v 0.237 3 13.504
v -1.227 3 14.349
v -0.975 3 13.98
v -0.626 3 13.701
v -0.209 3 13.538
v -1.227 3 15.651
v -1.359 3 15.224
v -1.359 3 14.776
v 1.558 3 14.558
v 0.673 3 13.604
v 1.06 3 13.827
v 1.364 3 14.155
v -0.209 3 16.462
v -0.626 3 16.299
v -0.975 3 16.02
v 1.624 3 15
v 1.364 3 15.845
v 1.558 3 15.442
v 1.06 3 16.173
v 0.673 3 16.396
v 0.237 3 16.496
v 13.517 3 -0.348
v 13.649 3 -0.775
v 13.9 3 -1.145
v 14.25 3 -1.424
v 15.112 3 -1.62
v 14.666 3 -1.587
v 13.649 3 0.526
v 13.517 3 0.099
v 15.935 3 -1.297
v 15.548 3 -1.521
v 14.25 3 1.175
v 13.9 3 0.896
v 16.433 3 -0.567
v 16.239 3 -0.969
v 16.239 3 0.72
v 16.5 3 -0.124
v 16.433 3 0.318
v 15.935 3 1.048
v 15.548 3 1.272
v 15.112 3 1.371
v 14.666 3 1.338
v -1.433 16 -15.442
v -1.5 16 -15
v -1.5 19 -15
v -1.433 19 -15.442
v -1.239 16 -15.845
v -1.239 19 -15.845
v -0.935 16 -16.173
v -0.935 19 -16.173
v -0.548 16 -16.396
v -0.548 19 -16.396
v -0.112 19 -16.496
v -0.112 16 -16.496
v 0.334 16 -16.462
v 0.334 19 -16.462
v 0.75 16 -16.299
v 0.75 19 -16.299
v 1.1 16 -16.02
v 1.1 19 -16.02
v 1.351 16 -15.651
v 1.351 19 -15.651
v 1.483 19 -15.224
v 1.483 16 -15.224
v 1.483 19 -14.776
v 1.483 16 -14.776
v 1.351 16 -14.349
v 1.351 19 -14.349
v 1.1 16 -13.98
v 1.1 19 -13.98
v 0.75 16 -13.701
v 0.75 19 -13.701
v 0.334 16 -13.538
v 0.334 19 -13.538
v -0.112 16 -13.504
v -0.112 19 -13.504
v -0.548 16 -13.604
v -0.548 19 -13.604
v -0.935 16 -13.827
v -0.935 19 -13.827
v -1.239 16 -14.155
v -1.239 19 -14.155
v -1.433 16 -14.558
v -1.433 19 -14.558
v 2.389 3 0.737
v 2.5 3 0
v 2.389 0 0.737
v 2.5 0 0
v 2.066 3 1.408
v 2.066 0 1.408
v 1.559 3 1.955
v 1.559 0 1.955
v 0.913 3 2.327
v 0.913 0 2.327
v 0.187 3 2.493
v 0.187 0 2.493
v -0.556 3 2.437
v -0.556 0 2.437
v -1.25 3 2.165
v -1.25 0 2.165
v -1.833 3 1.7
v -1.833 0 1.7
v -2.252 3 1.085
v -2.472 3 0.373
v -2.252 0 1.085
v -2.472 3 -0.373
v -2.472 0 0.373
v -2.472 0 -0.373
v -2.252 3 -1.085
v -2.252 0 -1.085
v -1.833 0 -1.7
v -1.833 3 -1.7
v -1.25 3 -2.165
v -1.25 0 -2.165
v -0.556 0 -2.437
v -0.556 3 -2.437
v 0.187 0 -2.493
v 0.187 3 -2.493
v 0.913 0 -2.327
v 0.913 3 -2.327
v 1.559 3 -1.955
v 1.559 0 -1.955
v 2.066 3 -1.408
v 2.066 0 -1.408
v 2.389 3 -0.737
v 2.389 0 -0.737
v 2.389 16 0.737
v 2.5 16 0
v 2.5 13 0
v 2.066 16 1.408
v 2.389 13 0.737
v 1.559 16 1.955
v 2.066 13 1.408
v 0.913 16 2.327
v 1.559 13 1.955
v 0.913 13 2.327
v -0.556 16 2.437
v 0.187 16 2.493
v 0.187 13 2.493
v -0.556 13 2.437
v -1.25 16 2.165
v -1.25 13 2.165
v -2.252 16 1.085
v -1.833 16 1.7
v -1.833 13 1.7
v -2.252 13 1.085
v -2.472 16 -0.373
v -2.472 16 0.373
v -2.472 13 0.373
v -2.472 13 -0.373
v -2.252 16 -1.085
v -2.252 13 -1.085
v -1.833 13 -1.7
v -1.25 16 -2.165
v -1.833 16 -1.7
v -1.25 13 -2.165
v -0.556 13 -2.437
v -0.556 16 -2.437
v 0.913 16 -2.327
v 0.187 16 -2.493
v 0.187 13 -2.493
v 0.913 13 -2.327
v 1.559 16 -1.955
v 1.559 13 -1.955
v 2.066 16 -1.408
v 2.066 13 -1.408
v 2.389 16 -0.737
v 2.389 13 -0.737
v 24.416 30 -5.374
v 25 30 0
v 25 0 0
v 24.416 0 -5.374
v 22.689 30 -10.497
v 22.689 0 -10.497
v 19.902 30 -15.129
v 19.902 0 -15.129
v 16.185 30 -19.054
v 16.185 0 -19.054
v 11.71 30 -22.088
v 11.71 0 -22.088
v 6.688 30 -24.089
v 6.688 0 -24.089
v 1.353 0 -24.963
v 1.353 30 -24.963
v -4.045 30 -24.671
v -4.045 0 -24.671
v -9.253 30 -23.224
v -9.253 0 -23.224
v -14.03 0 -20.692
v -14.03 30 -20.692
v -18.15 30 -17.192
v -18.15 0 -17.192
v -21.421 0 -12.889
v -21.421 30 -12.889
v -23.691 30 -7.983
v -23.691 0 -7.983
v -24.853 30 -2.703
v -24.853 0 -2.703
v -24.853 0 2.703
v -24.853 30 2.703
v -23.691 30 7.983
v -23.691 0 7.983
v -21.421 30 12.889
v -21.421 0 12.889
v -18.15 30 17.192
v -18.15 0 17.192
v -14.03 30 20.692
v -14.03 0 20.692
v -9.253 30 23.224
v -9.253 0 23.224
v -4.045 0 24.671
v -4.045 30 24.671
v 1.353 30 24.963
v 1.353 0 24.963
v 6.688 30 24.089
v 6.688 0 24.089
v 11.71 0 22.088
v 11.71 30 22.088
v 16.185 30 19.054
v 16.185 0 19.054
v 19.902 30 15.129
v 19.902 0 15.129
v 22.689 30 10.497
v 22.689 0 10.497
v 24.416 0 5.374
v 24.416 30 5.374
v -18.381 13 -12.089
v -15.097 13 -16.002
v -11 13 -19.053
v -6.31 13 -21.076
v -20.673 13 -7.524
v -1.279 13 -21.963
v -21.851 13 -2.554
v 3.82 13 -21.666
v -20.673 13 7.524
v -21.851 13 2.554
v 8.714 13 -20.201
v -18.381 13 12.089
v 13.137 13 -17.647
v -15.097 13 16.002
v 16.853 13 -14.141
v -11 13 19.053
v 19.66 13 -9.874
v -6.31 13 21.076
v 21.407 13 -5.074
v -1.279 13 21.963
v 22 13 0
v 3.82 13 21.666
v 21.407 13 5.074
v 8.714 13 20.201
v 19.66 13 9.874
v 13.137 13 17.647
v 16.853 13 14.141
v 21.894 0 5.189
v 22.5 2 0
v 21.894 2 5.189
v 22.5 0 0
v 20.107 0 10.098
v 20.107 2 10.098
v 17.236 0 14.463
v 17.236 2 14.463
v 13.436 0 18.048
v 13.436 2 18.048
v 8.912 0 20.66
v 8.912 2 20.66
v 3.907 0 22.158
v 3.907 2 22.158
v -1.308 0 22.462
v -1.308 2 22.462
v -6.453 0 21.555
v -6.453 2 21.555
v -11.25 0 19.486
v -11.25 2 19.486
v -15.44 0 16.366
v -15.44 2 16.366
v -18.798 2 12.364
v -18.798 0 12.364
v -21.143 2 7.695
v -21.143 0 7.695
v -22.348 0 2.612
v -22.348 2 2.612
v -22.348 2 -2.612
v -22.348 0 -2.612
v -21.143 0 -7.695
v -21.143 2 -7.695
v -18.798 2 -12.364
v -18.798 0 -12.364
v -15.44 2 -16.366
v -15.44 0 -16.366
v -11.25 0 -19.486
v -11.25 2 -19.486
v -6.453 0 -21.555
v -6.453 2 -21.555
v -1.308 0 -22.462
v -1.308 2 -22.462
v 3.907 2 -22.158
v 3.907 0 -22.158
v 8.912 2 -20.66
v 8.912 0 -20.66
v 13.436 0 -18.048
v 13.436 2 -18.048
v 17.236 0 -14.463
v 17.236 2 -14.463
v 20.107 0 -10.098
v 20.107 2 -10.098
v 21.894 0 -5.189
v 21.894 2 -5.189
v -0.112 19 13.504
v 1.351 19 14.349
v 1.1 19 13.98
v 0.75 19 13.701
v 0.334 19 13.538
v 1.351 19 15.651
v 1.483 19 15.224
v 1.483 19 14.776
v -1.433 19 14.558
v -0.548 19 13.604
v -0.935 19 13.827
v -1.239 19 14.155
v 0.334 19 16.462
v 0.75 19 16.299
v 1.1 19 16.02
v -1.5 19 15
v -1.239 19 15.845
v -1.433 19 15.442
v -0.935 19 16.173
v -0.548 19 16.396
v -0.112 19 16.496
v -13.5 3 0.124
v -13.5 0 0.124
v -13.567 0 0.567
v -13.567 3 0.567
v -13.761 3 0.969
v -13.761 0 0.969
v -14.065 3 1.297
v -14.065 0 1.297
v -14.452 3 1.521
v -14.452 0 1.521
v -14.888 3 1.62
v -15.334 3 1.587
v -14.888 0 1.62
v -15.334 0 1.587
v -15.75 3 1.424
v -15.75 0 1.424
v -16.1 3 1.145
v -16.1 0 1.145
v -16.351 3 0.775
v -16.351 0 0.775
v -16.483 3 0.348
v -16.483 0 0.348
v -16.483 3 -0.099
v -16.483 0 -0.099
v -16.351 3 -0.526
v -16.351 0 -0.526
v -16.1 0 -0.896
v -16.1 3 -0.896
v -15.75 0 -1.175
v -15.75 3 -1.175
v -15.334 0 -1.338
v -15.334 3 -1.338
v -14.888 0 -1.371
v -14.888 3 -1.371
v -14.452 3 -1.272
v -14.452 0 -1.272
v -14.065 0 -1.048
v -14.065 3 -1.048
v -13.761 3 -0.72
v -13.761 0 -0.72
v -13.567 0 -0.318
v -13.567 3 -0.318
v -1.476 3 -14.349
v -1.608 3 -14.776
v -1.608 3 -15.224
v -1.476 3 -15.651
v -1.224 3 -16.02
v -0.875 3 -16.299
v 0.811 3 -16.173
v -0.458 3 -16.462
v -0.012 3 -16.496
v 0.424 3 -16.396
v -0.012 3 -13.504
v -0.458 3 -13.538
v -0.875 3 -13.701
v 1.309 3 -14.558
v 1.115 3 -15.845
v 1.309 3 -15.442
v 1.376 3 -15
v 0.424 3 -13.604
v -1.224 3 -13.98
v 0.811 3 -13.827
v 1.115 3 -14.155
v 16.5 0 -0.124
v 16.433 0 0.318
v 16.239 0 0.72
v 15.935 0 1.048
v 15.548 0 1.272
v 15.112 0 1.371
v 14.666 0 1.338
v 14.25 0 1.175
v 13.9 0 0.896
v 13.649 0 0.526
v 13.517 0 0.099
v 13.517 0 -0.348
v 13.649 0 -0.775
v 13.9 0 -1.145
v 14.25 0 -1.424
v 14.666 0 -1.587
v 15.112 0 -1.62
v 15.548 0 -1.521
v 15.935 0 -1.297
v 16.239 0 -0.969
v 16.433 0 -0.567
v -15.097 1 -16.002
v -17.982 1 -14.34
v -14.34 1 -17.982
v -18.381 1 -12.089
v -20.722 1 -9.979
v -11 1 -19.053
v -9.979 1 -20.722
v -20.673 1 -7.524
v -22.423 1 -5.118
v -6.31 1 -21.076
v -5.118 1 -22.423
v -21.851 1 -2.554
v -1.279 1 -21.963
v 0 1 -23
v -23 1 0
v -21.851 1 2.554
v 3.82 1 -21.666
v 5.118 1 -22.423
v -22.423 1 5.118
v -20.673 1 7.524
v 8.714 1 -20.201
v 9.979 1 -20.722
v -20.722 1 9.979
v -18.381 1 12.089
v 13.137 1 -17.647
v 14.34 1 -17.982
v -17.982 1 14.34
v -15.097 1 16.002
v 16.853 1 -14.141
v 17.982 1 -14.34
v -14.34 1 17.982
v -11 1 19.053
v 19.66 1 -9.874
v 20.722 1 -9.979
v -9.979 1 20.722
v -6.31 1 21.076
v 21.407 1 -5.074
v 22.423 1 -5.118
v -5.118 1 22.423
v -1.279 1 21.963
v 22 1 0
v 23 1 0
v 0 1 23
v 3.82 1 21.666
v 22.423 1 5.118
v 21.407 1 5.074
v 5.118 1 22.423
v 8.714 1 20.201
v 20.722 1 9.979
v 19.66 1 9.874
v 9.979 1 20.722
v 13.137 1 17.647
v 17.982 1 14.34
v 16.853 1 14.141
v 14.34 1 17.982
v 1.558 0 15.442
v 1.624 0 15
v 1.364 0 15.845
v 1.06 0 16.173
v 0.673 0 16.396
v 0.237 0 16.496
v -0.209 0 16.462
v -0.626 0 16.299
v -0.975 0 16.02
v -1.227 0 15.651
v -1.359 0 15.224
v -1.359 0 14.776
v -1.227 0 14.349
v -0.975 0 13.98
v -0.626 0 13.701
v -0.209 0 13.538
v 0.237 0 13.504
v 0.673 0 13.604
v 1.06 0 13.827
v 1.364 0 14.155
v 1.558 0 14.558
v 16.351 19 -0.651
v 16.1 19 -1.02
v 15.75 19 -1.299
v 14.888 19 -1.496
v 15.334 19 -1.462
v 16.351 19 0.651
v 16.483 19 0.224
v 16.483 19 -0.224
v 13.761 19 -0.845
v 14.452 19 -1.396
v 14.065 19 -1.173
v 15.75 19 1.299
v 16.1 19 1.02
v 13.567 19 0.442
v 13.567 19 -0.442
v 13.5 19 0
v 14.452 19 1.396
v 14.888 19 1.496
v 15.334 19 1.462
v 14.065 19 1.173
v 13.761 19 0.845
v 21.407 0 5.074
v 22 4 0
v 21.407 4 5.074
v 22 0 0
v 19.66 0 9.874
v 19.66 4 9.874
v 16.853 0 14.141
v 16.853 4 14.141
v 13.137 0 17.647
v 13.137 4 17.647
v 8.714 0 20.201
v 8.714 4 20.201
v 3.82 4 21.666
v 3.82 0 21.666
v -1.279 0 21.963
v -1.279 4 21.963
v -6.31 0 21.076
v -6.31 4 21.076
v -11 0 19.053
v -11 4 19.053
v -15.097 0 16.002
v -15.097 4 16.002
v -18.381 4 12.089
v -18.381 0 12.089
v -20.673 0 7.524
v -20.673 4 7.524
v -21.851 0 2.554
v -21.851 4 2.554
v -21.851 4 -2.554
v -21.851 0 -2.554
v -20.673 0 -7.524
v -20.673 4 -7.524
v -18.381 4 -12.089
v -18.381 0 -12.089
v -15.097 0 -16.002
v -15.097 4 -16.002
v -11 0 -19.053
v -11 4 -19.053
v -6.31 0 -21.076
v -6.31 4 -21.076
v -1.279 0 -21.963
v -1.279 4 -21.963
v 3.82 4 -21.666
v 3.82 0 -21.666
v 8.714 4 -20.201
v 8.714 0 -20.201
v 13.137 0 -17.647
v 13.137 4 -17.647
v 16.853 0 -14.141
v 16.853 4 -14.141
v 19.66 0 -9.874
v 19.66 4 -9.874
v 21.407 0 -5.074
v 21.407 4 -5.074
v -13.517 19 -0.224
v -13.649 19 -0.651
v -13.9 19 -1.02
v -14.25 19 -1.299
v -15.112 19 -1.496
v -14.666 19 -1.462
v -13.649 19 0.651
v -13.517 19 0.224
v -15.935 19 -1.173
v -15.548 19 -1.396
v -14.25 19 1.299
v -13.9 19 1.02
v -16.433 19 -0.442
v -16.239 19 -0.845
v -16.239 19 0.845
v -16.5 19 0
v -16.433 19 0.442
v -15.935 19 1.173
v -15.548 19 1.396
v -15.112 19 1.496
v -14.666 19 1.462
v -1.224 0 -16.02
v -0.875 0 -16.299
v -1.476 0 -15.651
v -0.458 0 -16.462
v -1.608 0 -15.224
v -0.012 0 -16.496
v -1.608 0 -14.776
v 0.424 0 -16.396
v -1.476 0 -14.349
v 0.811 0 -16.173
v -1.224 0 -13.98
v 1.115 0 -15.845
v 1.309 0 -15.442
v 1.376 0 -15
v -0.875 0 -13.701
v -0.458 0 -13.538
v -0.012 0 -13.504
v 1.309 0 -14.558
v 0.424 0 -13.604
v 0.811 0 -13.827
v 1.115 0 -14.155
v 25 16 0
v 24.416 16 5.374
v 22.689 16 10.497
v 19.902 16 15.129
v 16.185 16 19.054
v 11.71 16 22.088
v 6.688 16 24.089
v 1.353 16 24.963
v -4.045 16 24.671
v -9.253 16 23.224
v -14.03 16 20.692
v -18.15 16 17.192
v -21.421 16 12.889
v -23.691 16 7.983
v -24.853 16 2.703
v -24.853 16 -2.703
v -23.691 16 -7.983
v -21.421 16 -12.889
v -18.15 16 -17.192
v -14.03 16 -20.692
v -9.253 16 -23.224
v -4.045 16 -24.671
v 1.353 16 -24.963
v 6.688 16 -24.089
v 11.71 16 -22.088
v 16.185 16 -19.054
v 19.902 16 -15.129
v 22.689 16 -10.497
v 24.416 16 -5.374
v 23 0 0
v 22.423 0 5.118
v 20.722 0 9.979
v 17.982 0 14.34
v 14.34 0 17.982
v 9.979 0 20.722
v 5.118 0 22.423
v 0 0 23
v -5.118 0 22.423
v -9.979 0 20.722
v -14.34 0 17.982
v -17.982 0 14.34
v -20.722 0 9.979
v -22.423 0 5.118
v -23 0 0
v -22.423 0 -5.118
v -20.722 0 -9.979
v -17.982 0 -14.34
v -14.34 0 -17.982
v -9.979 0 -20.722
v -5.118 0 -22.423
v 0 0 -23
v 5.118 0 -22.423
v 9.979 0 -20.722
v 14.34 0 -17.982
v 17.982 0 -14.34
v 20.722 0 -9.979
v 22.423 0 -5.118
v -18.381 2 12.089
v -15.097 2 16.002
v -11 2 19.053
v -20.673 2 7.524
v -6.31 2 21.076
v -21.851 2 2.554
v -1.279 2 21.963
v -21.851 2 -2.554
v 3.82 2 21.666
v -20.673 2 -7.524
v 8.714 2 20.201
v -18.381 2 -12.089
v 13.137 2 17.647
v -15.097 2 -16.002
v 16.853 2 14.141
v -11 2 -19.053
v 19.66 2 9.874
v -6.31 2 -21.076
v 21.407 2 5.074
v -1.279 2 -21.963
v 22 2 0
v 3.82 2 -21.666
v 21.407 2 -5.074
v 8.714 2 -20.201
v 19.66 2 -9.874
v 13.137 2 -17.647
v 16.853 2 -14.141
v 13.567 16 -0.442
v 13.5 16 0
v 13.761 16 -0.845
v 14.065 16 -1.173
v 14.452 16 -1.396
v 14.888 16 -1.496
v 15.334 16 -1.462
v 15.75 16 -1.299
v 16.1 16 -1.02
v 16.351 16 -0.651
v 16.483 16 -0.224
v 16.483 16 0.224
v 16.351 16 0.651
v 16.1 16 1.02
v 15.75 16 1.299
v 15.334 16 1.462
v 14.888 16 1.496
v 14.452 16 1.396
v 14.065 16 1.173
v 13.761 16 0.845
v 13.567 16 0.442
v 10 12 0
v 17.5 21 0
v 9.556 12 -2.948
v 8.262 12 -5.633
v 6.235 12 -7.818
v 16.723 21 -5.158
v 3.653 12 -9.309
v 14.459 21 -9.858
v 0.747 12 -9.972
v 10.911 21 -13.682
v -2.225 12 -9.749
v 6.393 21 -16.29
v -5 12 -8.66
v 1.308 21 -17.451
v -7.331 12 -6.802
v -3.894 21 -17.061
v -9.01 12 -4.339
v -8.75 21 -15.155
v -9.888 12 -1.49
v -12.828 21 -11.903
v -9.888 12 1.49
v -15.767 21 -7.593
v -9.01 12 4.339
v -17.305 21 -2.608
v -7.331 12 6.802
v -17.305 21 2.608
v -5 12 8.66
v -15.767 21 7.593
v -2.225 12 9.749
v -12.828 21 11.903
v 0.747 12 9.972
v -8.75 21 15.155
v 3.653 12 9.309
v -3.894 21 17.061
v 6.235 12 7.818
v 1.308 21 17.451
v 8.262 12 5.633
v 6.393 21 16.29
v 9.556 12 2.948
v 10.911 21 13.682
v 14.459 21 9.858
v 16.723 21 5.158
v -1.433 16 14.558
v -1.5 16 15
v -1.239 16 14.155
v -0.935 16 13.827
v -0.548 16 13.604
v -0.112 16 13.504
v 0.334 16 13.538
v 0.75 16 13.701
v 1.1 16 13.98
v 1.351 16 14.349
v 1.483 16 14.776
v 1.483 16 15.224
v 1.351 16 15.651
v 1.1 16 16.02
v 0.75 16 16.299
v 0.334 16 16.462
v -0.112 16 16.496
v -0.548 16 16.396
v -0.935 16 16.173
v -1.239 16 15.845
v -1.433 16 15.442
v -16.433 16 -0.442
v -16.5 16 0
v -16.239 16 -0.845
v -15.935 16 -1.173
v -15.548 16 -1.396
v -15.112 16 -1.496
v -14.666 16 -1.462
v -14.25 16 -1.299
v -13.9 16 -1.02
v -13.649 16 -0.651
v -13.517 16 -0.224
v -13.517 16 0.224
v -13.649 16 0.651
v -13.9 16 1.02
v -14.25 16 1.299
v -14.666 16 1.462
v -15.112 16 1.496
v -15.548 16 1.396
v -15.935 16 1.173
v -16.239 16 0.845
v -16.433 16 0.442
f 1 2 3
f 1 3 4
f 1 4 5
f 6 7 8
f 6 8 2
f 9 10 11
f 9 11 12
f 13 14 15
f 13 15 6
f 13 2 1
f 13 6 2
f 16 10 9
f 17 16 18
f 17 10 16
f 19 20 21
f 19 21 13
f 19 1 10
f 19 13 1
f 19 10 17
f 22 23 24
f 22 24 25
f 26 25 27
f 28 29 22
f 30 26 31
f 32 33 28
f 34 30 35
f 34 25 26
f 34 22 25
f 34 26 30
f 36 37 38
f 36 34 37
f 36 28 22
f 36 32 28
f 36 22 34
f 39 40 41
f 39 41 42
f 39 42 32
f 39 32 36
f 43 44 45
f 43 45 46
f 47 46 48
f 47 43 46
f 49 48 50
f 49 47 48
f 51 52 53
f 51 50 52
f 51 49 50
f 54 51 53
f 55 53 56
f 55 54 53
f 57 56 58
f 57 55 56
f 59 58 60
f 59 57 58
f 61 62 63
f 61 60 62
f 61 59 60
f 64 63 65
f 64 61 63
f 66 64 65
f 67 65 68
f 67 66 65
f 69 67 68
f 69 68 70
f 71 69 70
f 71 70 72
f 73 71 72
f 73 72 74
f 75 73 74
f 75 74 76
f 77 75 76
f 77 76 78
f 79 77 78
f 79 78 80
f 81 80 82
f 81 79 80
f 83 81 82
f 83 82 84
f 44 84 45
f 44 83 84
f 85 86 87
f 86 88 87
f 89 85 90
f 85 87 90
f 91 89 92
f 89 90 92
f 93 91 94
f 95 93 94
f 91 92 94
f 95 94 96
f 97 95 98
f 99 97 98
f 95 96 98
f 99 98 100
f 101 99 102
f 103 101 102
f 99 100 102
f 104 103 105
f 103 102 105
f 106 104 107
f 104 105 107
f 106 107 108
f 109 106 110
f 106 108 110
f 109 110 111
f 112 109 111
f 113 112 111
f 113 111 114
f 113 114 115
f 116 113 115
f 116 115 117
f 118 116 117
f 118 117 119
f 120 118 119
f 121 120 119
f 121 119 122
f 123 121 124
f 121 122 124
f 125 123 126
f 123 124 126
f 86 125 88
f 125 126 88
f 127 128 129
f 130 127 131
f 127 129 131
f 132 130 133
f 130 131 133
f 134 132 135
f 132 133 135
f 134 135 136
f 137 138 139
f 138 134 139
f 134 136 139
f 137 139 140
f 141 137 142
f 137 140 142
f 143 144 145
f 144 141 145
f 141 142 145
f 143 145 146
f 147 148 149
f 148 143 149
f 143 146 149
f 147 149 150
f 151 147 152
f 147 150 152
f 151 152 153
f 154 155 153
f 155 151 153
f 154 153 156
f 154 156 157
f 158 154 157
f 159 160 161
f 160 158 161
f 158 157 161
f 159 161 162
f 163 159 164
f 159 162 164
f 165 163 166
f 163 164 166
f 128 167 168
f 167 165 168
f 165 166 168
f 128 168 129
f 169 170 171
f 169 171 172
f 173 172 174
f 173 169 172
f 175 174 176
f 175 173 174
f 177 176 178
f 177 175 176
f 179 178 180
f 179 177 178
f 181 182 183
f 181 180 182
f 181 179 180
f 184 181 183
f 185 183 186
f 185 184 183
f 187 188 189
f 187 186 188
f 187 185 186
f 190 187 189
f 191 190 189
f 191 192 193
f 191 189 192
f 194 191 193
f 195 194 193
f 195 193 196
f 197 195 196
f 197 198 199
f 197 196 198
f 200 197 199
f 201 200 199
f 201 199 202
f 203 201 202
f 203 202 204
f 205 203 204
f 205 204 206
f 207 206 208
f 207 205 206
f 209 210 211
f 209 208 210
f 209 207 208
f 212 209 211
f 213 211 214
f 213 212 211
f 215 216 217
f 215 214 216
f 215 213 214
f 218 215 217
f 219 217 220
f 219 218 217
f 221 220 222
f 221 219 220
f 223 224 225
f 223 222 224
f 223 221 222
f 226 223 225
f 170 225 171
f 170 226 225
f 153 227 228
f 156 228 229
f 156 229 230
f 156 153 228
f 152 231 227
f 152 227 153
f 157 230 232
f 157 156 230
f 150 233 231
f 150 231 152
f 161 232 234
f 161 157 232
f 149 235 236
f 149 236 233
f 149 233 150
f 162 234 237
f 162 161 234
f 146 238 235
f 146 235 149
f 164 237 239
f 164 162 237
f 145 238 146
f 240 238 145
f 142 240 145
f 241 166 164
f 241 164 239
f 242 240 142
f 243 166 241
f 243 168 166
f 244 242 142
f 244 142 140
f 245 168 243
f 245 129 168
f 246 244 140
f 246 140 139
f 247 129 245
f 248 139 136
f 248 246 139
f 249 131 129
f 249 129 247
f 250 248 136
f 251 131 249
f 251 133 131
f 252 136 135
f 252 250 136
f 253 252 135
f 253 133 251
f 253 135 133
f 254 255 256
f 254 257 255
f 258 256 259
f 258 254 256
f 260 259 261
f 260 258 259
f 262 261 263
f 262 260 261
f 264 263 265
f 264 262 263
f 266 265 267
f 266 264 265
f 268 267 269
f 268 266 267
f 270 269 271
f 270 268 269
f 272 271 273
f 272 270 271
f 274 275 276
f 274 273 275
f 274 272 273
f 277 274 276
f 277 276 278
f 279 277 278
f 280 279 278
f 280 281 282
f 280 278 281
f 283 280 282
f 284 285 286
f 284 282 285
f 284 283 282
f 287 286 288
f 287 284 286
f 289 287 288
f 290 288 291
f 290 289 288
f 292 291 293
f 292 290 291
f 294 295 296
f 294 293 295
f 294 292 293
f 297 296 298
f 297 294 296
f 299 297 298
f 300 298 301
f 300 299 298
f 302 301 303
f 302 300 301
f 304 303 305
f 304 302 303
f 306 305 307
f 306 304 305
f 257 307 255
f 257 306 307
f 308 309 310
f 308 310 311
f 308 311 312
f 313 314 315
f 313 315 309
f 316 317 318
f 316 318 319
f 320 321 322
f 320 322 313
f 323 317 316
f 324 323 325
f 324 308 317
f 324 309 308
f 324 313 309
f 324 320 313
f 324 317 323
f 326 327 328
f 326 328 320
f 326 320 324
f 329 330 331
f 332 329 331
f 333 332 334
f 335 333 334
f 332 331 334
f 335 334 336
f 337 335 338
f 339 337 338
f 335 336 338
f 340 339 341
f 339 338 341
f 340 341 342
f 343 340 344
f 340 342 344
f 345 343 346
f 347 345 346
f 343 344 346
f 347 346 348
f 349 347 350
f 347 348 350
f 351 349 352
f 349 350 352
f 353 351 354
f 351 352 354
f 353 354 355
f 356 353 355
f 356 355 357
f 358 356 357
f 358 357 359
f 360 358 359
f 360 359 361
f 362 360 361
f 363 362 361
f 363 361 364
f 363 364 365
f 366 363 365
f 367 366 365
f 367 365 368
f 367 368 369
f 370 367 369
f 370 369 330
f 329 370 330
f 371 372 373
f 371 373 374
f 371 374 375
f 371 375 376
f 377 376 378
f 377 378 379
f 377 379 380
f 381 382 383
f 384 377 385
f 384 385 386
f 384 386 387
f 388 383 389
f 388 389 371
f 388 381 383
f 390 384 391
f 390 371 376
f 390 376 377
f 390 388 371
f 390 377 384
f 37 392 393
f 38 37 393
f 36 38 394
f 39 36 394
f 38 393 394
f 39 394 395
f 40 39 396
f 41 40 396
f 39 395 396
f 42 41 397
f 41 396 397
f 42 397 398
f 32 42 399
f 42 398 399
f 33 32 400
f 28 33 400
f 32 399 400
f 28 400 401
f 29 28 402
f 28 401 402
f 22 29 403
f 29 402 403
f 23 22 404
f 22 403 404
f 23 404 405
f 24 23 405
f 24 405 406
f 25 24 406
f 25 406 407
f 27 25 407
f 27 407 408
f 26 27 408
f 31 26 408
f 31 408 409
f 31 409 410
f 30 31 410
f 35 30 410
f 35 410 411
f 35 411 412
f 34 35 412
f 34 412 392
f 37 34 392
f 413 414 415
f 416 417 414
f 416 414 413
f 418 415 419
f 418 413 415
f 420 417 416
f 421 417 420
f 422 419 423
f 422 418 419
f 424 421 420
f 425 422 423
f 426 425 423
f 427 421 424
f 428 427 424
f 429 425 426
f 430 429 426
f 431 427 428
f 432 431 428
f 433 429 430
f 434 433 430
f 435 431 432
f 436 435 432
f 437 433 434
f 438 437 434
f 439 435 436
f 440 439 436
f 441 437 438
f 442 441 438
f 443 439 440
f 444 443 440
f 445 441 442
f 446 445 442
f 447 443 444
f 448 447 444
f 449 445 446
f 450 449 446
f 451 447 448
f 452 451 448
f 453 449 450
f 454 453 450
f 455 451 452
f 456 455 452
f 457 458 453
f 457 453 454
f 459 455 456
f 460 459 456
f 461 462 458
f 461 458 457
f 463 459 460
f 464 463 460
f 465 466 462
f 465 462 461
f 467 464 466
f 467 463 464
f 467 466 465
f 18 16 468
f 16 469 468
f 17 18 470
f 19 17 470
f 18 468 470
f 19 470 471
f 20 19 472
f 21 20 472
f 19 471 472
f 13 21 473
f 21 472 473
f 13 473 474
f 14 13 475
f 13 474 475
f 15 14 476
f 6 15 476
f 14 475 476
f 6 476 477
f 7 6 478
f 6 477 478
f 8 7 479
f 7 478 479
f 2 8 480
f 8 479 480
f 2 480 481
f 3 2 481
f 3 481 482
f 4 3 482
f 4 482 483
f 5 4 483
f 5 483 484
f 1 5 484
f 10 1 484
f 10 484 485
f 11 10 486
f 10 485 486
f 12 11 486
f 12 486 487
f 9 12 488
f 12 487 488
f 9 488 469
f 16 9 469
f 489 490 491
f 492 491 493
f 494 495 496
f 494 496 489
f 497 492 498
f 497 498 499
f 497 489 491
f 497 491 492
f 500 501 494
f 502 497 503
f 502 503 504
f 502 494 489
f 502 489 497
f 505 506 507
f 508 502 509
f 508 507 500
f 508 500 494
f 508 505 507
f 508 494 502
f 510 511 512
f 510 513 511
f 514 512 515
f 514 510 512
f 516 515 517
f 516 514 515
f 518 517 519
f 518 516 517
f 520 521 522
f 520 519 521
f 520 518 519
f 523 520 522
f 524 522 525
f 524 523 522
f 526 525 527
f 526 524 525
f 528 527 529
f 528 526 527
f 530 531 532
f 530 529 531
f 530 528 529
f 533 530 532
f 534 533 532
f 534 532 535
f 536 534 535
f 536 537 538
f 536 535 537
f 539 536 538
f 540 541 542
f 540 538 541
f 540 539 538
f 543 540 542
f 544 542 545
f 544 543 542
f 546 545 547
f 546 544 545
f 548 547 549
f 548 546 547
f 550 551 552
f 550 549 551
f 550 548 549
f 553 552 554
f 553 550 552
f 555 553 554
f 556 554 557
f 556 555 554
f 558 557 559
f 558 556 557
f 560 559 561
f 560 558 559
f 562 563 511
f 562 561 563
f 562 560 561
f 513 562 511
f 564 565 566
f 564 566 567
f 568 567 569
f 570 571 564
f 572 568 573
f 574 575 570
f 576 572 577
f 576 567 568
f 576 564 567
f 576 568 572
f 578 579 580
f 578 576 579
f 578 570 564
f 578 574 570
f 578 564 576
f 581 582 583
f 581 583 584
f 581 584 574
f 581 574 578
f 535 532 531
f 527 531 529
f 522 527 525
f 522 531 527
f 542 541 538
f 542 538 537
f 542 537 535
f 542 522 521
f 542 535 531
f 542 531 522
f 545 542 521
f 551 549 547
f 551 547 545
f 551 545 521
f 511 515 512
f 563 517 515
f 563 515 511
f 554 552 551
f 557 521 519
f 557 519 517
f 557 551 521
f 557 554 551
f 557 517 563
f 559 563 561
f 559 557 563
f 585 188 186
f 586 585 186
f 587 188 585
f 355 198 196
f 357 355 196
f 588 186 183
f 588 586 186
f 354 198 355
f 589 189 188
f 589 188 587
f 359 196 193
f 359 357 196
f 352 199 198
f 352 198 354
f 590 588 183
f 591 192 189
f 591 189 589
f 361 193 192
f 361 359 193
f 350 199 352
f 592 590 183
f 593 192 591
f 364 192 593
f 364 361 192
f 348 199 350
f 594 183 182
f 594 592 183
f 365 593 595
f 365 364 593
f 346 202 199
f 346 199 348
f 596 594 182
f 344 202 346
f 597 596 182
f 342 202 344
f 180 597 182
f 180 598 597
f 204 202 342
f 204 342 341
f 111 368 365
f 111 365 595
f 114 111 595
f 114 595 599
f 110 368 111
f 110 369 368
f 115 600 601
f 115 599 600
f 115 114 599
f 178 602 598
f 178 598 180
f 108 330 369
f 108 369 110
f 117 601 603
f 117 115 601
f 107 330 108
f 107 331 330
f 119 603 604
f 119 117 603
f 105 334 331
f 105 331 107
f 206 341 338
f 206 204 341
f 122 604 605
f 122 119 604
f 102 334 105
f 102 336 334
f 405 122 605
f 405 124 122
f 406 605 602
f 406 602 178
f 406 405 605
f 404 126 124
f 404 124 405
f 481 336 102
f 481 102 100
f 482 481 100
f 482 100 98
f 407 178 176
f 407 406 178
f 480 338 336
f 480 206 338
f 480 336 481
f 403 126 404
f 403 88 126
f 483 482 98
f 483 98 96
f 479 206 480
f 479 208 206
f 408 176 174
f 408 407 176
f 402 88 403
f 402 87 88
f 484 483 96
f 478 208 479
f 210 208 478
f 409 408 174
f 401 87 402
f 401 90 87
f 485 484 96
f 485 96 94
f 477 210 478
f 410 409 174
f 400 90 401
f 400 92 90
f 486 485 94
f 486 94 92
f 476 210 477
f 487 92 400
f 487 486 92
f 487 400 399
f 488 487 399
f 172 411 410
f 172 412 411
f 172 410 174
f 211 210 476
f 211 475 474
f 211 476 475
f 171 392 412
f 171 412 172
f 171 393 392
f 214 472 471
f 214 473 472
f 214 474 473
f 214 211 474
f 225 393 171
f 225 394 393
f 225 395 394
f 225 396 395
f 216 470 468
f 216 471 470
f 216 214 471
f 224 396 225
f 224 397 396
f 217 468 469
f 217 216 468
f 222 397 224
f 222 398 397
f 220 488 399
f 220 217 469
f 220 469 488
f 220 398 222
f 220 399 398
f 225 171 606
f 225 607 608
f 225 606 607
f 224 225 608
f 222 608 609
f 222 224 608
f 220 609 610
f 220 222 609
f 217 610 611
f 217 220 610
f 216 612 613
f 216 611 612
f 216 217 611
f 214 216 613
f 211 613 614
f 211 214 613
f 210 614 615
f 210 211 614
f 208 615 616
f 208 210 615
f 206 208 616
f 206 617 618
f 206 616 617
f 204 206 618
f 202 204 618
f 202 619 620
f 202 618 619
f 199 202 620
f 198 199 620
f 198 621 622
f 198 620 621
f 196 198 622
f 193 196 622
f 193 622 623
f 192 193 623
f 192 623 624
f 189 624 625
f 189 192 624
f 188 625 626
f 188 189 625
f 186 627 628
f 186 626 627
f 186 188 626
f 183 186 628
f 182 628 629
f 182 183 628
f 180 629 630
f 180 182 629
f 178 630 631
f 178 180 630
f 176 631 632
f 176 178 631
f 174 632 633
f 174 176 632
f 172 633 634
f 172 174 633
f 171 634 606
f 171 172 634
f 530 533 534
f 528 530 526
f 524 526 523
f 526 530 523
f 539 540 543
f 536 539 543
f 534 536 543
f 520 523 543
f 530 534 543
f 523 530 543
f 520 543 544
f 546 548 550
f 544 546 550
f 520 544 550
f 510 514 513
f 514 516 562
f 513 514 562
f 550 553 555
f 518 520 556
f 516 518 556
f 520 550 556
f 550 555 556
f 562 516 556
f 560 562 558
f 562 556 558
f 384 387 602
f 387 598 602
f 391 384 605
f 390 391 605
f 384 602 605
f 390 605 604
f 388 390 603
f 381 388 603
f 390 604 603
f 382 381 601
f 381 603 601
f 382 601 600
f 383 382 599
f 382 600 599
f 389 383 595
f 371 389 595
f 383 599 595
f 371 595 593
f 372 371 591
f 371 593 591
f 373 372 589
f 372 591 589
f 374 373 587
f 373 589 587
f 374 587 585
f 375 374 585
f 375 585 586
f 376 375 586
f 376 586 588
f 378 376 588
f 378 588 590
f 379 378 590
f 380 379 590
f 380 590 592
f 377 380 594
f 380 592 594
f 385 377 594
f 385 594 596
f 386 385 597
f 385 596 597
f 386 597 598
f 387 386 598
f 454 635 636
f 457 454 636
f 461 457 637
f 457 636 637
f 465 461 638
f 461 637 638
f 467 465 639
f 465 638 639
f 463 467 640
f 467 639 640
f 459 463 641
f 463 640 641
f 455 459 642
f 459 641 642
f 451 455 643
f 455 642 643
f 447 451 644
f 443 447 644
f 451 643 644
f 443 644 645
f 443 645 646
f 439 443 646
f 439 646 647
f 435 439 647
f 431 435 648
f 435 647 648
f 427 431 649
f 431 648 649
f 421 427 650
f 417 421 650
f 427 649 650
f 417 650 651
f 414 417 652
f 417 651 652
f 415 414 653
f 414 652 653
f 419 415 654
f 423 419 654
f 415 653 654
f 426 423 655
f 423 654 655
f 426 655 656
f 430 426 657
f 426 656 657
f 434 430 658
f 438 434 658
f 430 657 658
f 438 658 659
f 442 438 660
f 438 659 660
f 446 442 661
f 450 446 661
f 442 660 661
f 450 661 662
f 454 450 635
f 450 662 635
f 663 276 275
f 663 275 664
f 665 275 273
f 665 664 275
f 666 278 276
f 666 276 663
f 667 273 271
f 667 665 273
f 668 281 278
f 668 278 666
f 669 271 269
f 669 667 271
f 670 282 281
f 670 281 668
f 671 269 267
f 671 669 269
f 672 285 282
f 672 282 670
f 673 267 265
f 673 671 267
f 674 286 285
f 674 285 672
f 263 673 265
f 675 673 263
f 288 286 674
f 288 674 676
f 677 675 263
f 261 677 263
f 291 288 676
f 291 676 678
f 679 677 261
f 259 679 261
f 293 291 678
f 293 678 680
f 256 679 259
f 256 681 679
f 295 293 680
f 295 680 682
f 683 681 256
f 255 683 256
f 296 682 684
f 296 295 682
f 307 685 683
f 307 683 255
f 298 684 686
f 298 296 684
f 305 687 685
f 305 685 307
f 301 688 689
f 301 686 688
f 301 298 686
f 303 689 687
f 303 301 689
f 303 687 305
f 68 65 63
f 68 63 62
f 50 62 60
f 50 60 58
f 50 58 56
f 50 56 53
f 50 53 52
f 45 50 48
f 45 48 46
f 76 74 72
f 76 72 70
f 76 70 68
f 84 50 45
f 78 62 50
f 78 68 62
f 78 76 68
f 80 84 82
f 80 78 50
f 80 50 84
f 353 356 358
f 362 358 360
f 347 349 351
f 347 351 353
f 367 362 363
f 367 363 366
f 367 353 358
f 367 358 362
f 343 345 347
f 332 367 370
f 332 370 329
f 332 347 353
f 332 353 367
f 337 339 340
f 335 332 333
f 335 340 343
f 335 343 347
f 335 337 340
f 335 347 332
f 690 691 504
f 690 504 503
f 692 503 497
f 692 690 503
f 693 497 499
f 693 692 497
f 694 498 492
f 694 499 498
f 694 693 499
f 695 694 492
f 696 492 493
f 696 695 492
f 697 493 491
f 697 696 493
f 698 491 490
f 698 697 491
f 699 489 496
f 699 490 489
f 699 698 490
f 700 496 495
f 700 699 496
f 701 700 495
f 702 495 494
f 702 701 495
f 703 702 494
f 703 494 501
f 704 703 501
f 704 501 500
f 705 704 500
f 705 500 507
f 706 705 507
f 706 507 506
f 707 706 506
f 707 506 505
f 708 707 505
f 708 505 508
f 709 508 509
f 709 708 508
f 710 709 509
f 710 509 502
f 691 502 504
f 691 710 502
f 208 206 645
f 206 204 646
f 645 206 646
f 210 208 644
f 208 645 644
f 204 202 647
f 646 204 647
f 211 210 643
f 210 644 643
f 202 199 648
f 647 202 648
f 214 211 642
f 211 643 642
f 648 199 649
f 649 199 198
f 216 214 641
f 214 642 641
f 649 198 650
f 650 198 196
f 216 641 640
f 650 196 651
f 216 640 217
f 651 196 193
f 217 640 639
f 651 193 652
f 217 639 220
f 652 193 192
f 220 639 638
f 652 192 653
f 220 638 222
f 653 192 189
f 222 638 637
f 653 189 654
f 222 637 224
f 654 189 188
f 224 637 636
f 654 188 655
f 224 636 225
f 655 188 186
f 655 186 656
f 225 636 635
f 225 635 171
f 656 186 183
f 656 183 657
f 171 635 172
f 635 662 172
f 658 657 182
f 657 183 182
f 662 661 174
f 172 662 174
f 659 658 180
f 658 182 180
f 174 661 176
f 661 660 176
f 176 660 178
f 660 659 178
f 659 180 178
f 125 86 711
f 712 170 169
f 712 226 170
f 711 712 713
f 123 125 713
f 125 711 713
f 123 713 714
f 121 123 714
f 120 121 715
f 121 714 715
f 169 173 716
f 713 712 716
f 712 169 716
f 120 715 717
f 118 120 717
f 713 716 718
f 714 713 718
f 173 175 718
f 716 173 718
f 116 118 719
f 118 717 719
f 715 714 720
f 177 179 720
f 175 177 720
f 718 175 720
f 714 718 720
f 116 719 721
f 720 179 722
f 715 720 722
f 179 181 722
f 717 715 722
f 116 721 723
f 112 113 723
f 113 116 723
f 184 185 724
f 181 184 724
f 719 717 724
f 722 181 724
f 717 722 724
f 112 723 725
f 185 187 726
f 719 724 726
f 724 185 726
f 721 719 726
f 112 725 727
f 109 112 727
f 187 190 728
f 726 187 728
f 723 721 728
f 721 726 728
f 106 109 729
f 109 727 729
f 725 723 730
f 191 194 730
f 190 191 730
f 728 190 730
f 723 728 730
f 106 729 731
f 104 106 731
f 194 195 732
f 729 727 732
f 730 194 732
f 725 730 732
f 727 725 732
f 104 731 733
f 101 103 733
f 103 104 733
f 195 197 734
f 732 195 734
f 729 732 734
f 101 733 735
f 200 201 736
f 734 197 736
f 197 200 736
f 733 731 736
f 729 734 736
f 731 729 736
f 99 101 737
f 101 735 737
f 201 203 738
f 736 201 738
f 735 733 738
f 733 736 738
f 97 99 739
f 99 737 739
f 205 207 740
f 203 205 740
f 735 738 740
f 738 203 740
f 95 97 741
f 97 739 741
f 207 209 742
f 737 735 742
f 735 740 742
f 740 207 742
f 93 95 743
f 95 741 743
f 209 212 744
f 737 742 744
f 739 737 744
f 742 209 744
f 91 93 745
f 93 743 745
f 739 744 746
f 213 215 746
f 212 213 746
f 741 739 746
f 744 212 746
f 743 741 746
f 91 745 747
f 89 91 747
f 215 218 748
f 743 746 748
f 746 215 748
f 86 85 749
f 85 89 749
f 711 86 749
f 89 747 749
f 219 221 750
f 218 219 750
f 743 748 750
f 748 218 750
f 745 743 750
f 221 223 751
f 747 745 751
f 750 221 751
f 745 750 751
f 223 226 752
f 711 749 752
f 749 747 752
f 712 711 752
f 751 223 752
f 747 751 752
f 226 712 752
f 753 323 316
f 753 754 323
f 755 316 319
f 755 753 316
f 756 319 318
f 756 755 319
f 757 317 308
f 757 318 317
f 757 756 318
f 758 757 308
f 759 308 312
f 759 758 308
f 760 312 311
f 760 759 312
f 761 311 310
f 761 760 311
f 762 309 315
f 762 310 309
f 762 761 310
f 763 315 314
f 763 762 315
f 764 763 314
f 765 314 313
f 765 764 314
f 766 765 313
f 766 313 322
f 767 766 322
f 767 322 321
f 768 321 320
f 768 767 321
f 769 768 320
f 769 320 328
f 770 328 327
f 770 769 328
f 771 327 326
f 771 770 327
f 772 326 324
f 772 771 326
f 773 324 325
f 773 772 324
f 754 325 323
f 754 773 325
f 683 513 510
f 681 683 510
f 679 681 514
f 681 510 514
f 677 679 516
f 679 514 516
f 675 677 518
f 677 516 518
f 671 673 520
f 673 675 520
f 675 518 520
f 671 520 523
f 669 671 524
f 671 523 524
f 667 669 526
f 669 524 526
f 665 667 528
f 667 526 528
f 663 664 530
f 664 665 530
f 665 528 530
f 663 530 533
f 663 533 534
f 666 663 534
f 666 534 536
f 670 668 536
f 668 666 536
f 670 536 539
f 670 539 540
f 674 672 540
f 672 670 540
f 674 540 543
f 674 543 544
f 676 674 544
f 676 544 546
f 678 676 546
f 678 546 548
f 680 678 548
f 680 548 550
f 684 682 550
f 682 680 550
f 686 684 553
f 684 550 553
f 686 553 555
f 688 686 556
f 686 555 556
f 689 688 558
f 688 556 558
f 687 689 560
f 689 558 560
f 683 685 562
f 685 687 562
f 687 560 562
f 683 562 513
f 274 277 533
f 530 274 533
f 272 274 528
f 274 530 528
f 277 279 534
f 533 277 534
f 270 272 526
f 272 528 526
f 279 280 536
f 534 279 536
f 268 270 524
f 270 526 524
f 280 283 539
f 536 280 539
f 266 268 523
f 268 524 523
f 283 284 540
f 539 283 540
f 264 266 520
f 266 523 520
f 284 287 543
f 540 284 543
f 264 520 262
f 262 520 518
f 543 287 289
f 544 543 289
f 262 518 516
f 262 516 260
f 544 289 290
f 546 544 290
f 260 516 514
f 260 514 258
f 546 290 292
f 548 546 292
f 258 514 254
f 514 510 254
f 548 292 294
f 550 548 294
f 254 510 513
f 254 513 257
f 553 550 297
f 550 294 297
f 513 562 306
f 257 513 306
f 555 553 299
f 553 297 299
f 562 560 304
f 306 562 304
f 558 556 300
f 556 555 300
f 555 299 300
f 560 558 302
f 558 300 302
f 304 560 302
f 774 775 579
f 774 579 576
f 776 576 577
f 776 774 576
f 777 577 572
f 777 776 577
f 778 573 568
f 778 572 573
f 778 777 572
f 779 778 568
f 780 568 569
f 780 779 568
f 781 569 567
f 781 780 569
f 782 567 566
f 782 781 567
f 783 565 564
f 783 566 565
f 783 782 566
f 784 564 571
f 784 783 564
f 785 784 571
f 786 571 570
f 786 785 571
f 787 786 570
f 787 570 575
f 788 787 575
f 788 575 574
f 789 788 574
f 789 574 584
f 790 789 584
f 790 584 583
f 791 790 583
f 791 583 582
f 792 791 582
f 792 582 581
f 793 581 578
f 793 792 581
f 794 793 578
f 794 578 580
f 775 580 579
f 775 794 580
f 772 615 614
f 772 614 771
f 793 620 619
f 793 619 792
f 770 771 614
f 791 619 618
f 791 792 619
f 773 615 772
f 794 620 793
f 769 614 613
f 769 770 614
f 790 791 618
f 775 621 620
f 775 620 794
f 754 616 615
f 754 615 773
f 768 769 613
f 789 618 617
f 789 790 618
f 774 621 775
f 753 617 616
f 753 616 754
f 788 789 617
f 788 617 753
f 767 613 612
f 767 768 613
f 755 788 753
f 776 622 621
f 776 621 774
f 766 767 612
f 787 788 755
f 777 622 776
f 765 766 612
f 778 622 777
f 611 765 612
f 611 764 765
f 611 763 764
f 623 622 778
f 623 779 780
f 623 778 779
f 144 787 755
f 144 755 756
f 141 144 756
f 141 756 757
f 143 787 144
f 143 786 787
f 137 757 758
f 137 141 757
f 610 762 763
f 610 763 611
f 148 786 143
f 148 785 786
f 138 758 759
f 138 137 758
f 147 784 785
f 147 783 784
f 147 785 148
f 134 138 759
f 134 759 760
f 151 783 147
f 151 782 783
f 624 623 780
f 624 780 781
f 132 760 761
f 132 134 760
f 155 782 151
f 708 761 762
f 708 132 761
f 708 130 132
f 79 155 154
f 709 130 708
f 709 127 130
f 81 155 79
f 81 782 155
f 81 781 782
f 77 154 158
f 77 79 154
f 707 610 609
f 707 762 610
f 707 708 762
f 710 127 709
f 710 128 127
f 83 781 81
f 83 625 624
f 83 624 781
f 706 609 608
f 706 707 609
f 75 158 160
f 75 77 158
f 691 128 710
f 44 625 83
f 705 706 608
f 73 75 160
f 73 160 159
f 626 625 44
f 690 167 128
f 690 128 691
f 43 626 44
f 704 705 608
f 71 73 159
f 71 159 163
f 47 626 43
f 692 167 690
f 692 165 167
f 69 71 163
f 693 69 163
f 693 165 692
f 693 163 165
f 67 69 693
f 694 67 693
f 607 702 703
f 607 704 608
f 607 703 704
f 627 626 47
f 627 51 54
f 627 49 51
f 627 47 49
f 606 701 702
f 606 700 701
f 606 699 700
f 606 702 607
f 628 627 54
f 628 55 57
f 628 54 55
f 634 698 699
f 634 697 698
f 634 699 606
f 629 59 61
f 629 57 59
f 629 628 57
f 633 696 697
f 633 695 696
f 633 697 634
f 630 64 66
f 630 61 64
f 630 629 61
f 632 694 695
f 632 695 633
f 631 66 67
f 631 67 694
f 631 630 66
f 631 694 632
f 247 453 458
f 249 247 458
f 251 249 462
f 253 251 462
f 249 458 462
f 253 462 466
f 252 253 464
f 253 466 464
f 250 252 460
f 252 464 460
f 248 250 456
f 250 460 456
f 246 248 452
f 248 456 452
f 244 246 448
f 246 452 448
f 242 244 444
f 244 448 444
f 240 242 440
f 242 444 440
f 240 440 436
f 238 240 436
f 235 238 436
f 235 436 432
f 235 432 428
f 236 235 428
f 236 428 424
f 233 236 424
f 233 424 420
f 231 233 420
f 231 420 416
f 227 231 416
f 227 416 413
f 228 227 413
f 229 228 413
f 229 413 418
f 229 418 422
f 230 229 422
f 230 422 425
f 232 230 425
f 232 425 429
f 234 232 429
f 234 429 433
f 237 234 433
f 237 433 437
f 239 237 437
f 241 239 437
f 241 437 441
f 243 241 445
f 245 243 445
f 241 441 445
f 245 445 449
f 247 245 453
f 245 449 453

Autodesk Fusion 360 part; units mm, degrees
sketch "Sketch1" plane through (0, 0, 0) normal (0, 0, 1) x (1, 0, 0) in component "lejek"
  line L0 (0, 0) -> (25, 0)
  line L1 (25, 0) -> (25, 30)
  line L2 (25, 30) -> (0, 0)
  line L3 (0, 80) -> (0, -63.8211) construction
  dimension "d1" = 25
  dimension "d2" = 30
revolve "Revolve1" add sketch "Sketch1" angle 360 about axis through (0, 80, 0) along (0, -1, 0) makes body 1 in component "lejek"
sketch "Sketch2" plane through (0, 0, 0) normal (0, -1, 0) x (1, 0, 0) in component "lejek"
  circle A0 centre (0, 0) radius 25
  circle A1 centre (0, 0) radius 2.5
  dimension "d4" = 5
extrude "Extrude1" cut sketch "Sketch2" against normal blind 10 contours A1 bodies 1 in component "lejek"
sketch "Sketch1 (2)" plane through (0, 0, 0) normal (0, 1, 0) x (1, 0, 0) in component "koncowka"
  circle A0 centre (0, 0) radius 25
extrude "Extrude1'" add sketch "Sketch1 (2)" along normal blind 16 separate body makes body 2 in component "koncowka"
sketch "Sketch2 (2)" plane through (0, 0, 0) normal (0, 1, 0) x (1, 0, 0) in component "koncowka"
  circle A0 centre (0, 0) radius 2.5
  dimension "d9" = 5
extrude "Extrude3" cut sketch "Sketch2 (2)" along normal up to surface (16 mm away) bodies 2 in component "koncowka"
sketch "Sketch3" plane through (0, 0, 0) normal (0, -1, 0) x (1, 0, 0) in component "koncowka"
  circle A0 centre (0, 0) radius 2.5
  circle A1 centre (0, 0) radius 25
  circle A2 centre (0, 0) radius 22
  dimension "d15" = -3
extrude "Extrude4" cut sketch "Sketch3" against normal blind 13 contours A2 bodies 2 in component "koncowka"
sketch "Sketch4" plane through (0, 0, 0) normal (0, -1, 0) x (1, 0, 0) in component "koncowka"
  circle A0 centre (0, 0) radius 22
  circle A1 centre (0, 0) radius 25
  circle A2 centre (0, 0) radius 23
  dimension "d18" = 1
extrude "Extrude5" cut sketch "Sketch4" against normal blind 1 contours A2 bodies 2 in component "koncowka"
sketch "Sketch5" plane through (0, 16, 0) normal (0, 1, 0) x (-1, 0, 0) in component "koncowka"
  circle A0 centre (0, 0) radius 2.5
  circle A1 centre (0, 0) radius 25
  circle A2 centre (15, 0) radius 1.5
  dimension "d22" = 3
extrude "Extrude6" add sketch "Sketch5" along normal blind 3 contours A2 bodies 2 in component "koncowka"
sketch "Sketch6" plane through (0, 16, 0) normal (0, 1, 0) x (-1, 0, 0) in component "koncowka"
  circle A0 centre (15, 0) radius 1.5
  circle A1 centre (0, 0) radius 2.5
  circle A2 centre (0, 0) radius 25
  circle A3 centre (0, 15) radius 1.5
  circle A4 centre (-15, 0) radius 1.5
  circle A5 centre (0, -15) radius 1.5
  dimension "d26" = 360
extrude "Extrude8" add sketch "Sketch6" along normal blind 3 contours A4 bodies 2 in component "koncowka"
extrude "Extrude7" add sketch "Sketch6" along normal blind 3 contours A3 bodies 2 in component "koncowka"
sketch "Sketch7" plane through (0, 16, 0) normal (0, 1, 0) x (-1, 0, 0) in component "koncowka"
  circle A0 centre (0, 15) radius 1.5
  circle A1 centre (15, 0) radius 1.5
  circle A2 centre (0, 0) radius 2.5
  circle A3 centre (0, 0) radius 25
  circle A4 centre (-15, 0) radius 1.5
extrude "Extrude9" add sketch "Sketch6" along normal blind 3 contours A5 bodies 2 in component "koncowka"
sketch "Sketch8" plane through (0, 0, 0) normal (0, -1, 0) x (1, 0, 0) in component "koncowka"
  circle A0 centre (0, 0) radius 2.5
  circle A1 centre (0, 0) radius 25
  circle A2 centre (0, 0) radius 22.9534
sketch "Sketch3 (2)" plane through (0, 0, 0) normal (0, -1, 0) x (1, 0, 0) in component "lejek"
  circle A0 centre (0, 0) radius 2.5
  circle A1 centre (0, 0) radius 25
  circle A2 centre (15, -0.1245) radius 1.5
  circle A3 centre (0.1245, 15) radius 1.5
  circle A4 centre (-15, 0.1245) radius 1.5
  circle A5 centre (-0.1245, -15) radius 1.5
  dimension "d33" = 3
  dimension "d34" = 15
  dimension "d36" = 360
extrude "Extrude2" cut sketch "Sketch3 (2)" against normal blind 3 contours A2 | A3 | A4 | A5 bodies 1 in component "lejek"
sketch "Sketch1 (3)" plane through (0, 0, 0) normal (0, 1, 0) x (1, 0, 0) in component "pokrywka"
  circle A0 centre (0, 0) radius 22
  circle A1 centre (0, 0) radius 22.5
  dimension "d39" = 44
  dimension "d40" = 45
extrude "Extrude2'" add sketch "Sketch1 (3)" along normal blind 4 separate body contours A0 makes body 3 in component "pokrywka"
extrude "Extrude1''" add sketch "Sketch1 (3)" along normal blind 2 separate body makes body 4 in component "pokrywka"
component "lejek" placed x (1, 0, 0) y (0, 1, 0) z (0, 0, 1) at (0, 0, 0)
component "koncowka" placed x (1, 0, 0) y (0, 1, 0) z (0, 0, 1) at (0, 0, 0)
component "pokrywka" placed x (1, 0, 0) y (0, 1, 0) z (0, 0, 1) at (0, 0, 0)
